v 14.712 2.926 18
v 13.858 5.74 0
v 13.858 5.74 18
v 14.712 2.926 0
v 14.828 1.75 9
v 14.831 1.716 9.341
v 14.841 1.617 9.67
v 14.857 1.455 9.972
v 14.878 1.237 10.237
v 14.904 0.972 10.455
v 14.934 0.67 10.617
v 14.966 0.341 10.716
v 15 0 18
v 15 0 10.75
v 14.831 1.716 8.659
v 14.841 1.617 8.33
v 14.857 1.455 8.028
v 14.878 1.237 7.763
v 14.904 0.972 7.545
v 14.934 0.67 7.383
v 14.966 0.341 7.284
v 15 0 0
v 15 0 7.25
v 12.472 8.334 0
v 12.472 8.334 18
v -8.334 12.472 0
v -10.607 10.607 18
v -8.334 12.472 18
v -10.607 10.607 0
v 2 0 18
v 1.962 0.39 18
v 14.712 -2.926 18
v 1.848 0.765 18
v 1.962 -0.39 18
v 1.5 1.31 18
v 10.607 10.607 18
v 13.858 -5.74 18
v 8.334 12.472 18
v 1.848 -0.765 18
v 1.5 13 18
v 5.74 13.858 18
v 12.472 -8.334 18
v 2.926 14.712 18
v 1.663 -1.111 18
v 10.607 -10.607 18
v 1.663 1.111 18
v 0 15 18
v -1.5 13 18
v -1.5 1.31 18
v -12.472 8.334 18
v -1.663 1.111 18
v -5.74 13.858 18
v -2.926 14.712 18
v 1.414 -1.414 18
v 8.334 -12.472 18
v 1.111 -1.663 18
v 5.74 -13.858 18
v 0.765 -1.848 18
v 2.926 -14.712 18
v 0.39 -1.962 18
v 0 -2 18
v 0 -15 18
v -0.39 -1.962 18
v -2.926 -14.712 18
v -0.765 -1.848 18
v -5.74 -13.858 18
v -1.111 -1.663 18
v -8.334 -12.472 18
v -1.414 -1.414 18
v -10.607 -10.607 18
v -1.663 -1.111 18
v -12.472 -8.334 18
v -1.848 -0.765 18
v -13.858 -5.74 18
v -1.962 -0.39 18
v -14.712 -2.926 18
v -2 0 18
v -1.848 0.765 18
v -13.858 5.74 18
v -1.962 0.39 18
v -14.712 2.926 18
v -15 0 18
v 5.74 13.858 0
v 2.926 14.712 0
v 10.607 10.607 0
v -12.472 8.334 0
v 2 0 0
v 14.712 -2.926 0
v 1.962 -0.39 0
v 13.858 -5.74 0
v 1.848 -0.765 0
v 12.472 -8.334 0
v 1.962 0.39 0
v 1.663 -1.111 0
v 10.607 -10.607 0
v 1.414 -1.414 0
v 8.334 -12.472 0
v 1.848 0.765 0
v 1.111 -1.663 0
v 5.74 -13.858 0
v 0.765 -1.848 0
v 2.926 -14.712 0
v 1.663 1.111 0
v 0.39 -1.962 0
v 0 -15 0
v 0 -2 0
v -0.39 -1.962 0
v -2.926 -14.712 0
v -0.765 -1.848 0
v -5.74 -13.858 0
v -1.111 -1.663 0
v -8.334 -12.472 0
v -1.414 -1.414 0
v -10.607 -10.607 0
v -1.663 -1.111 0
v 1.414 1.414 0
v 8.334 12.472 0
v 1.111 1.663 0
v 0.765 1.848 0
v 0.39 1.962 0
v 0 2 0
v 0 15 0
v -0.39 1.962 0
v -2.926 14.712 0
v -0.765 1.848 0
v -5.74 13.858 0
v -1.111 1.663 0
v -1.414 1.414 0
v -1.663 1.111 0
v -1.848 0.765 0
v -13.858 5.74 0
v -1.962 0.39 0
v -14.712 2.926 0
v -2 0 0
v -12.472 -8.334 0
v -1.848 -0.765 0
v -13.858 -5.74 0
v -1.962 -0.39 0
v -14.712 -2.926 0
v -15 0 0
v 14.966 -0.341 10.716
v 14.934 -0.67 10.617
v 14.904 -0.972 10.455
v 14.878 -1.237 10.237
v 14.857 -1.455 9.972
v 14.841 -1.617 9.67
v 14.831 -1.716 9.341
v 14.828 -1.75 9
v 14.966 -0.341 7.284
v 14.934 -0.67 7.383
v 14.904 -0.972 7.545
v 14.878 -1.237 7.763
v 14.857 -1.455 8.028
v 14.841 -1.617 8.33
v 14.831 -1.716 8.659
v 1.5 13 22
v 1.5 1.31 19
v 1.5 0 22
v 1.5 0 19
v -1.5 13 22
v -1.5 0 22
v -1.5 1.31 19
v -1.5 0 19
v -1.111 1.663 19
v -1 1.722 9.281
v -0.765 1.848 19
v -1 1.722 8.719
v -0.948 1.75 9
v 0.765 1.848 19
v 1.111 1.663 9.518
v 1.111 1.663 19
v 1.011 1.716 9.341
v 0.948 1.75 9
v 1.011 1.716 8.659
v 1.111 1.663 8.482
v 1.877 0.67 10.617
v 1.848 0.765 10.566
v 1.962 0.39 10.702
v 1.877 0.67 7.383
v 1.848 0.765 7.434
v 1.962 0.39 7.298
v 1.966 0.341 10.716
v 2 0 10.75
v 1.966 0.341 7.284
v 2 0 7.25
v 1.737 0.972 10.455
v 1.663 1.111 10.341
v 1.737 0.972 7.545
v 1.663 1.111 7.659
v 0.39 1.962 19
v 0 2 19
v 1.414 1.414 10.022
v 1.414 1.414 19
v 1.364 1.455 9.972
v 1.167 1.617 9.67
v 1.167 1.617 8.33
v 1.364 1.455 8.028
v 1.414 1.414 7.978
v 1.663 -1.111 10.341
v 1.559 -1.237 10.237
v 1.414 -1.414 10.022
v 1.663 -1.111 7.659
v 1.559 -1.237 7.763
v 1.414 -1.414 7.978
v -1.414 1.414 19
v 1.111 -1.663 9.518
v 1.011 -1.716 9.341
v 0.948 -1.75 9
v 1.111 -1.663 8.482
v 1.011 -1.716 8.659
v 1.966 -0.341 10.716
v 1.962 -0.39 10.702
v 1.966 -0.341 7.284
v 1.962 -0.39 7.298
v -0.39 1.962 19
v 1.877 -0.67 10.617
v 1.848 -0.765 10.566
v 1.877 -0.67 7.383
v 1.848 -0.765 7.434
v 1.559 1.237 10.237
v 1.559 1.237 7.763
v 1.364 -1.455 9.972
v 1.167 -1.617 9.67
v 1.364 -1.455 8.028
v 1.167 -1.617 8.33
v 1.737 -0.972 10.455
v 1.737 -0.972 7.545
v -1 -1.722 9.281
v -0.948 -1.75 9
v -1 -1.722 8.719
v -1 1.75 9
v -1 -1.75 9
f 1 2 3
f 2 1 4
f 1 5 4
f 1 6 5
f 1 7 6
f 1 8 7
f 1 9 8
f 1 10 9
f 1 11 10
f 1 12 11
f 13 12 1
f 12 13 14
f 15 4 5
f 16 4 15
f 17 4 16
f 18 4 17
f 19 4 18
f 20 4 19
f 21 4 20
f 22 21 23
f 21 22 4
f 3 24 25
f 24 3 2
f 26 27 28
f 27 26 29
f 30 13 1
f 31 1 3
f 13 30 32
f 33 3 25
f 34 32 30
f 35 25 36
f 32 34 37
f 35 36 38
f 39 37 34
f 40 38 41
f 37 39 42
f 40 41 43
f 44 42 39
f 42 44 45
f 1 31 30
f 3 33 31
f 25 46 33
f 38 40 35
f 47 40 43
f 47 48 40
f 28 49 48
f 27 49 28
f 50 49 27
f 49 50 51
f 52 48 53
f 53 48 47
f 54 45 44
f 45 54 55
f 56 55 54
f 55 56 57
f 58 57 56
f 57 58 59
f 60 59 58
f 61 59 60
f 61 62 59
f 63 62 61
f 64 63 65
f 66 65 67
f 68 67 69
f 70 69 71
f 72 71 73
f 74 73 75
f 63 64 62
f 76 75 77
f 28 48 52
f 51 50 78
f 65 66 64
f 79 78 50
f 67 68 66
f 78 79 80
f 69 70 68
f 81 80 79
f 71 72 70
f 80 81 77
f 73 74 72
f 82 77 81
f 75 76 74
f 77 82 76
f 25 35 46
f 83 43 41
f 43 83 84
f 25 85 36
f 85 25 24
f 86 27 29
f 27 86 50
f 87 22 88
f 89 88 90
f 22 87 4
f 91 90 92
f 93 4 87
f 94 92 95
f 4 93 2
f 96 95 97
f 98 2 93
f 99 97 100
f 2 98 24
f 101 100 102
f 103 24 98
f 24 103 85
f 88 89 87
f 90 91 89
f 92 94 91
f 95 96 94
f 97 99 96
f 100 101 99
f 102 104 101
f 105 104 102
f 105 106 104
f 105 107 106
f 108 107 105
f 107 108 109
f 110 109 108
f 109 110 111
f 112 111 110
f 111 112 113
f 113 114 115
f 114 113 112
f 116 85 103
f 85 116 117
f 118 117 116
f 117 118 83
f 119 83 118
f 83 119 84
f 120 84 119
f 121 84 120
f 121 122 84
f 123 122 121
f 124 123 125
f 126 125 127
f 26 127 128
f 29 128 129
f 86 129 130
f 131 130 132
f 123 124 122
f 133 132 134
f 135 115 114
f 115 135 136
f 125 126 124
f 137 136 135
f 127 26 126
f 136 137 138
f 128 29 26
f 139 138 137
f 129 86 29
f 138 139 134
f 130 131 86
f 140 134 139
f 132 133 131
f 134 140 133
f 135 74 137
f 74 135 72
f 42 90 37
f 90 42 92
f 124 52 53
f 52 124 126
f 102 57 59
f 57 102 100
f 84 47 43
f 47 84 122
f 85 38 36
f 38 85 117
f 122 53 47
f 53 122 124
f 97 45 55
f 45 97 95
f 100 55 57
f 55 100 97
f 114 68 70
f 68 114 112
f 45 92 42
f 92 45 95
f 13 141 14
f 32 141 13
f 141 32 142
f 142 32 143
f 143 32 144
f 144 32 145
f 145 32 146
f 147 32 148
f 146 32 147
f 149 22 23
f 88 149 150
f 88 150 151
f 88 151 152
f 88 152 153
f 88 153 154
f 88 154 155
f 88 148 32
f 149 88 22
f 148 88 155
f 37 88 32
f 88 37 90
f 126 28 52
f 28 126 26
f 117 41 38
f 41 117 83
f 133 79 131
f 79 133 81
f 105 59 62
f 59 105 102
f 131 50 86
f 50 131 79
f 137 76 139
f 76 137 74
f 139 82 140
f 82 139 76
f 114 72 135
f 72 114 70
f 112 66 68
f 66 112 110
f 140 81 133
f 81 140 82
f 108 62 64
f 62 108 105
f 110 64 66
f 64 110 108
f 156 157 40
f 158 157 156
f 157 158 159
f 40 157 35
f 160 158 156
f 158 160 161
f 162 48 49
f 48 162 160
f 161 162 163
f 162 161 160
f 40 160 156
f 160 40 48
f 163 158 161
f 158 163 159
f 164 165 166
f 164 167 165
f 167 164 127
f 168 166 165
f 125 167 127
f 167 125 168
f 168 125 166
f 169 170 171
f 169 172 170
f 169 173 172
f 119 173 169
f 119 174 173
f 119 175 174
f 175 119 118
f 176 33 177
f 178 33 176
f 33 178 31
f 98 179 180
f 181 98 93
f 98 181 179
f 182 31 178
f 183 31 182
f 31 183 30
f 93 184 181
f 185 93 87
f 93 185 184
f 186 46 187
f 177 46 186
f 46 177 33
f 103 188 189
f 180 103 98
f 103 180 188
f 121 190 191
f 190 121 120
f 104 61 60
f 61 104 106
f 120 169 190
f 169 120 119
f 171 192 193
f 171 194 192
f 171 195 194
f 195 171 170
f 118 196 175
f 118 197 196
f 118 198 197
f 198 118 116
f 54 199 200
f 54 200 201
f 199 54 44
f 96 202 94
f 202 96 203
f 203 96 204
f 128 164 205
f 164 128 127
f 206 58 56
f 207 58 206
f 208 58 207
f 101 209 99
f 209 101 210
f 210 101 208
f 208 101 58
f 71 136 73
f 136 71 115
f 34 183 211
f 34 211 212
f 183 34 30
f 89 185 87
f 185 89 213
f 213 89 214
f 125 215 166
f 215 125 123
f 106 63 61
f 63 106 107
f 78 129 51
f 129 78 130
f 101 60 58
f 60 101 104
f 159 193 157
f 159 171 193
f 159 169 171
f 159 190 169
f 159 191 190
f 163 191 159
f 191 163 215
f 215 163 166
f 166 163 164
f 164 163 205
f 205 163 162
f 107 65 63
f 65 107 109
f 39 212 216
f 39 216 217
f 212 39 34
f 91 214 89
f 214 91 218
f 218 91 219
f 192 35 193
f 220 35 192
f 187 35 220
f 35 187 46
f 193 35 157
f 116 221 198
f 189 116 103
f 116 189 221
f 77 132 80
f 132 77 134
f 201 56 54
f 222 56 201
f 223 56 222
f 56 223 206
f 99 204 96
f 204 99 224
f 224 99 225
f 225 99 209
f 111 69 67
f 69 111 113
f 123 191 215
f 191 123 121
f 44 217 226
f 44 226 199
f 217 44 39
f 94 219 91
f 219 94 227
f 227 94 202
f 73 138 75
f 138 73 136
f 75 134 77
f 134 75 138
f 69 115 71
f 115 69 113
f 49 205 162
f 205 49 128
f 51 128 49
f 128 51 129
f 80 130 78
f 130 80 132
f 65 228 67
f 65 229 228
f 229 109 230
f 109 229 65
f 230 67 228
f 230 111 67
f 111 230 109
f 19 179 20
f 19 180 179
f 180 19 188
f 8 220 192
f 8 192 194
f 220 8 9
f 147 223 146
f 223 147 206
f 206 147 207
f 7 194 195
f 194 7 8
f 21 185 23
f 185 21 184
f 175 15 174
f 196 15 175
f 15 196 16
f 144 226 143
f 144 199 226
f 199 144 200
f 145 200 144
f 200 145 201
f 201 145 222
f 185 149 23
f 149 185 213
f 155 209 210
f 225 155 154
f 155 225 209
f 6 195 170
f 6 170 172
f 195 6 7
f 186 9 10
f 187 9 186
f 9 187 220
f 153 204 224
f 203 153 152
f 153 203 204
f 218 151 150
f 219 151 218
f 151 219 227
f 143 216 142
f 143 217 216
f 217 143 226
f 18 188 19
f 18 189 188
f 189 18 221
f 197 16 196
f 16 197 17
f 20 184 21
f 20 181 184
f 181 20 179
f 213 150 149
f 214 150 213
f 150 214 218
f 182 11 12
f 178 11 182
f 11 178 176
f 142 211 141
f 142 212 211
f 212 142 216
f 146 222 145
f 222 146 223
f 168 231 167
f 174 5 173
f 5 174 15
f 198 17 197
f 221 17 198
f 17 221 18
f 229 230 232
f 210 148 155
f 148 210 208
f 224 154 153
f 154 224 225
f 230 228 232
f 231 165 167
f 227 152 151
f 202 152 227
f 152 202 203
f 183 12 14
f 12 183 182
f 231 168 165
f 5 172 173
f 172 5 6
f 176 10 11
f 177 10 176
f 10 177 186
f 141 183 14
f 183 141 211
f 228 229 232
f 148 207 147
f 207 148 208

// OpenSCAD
$fn = 32;

// ----------------------------------------------------------------------
// Control knob: pointer knob
// ----------------------------------------------------------------------

// --- parameters (mm) ---
rib_w = 3;                // pointer rib width
rib_h = 5;                // pointer rib height
knob_d = 30;              // knob body diameter
knob_h = 18;              // knob body height
bore_d = 4;               // shaft bore diameter
set_d = 3.5;              // set screw bore diameter

rib_poke = rib_h - 1;  // rib height above the top
total_h = knob_h + rib_h - 1;  // overall height

difference() {
  union() {
    cylinder(h = knob_h, d = knob_d);
    translate([-rib_w / 2, 0, knob_h - 1])
      cube([rib_w, knob_d / 2 - 2, rib_h]);
  }
  translate([0, 0, -1]) cylinder(h = knob_h + 2, d = bore_d);
  translate([-1, 0, knob_h / 2]) rotate([0, 90, 0])
    cylinder(h = knob_d / 2 + bore_d / 2 + 2, d = set_d);}
